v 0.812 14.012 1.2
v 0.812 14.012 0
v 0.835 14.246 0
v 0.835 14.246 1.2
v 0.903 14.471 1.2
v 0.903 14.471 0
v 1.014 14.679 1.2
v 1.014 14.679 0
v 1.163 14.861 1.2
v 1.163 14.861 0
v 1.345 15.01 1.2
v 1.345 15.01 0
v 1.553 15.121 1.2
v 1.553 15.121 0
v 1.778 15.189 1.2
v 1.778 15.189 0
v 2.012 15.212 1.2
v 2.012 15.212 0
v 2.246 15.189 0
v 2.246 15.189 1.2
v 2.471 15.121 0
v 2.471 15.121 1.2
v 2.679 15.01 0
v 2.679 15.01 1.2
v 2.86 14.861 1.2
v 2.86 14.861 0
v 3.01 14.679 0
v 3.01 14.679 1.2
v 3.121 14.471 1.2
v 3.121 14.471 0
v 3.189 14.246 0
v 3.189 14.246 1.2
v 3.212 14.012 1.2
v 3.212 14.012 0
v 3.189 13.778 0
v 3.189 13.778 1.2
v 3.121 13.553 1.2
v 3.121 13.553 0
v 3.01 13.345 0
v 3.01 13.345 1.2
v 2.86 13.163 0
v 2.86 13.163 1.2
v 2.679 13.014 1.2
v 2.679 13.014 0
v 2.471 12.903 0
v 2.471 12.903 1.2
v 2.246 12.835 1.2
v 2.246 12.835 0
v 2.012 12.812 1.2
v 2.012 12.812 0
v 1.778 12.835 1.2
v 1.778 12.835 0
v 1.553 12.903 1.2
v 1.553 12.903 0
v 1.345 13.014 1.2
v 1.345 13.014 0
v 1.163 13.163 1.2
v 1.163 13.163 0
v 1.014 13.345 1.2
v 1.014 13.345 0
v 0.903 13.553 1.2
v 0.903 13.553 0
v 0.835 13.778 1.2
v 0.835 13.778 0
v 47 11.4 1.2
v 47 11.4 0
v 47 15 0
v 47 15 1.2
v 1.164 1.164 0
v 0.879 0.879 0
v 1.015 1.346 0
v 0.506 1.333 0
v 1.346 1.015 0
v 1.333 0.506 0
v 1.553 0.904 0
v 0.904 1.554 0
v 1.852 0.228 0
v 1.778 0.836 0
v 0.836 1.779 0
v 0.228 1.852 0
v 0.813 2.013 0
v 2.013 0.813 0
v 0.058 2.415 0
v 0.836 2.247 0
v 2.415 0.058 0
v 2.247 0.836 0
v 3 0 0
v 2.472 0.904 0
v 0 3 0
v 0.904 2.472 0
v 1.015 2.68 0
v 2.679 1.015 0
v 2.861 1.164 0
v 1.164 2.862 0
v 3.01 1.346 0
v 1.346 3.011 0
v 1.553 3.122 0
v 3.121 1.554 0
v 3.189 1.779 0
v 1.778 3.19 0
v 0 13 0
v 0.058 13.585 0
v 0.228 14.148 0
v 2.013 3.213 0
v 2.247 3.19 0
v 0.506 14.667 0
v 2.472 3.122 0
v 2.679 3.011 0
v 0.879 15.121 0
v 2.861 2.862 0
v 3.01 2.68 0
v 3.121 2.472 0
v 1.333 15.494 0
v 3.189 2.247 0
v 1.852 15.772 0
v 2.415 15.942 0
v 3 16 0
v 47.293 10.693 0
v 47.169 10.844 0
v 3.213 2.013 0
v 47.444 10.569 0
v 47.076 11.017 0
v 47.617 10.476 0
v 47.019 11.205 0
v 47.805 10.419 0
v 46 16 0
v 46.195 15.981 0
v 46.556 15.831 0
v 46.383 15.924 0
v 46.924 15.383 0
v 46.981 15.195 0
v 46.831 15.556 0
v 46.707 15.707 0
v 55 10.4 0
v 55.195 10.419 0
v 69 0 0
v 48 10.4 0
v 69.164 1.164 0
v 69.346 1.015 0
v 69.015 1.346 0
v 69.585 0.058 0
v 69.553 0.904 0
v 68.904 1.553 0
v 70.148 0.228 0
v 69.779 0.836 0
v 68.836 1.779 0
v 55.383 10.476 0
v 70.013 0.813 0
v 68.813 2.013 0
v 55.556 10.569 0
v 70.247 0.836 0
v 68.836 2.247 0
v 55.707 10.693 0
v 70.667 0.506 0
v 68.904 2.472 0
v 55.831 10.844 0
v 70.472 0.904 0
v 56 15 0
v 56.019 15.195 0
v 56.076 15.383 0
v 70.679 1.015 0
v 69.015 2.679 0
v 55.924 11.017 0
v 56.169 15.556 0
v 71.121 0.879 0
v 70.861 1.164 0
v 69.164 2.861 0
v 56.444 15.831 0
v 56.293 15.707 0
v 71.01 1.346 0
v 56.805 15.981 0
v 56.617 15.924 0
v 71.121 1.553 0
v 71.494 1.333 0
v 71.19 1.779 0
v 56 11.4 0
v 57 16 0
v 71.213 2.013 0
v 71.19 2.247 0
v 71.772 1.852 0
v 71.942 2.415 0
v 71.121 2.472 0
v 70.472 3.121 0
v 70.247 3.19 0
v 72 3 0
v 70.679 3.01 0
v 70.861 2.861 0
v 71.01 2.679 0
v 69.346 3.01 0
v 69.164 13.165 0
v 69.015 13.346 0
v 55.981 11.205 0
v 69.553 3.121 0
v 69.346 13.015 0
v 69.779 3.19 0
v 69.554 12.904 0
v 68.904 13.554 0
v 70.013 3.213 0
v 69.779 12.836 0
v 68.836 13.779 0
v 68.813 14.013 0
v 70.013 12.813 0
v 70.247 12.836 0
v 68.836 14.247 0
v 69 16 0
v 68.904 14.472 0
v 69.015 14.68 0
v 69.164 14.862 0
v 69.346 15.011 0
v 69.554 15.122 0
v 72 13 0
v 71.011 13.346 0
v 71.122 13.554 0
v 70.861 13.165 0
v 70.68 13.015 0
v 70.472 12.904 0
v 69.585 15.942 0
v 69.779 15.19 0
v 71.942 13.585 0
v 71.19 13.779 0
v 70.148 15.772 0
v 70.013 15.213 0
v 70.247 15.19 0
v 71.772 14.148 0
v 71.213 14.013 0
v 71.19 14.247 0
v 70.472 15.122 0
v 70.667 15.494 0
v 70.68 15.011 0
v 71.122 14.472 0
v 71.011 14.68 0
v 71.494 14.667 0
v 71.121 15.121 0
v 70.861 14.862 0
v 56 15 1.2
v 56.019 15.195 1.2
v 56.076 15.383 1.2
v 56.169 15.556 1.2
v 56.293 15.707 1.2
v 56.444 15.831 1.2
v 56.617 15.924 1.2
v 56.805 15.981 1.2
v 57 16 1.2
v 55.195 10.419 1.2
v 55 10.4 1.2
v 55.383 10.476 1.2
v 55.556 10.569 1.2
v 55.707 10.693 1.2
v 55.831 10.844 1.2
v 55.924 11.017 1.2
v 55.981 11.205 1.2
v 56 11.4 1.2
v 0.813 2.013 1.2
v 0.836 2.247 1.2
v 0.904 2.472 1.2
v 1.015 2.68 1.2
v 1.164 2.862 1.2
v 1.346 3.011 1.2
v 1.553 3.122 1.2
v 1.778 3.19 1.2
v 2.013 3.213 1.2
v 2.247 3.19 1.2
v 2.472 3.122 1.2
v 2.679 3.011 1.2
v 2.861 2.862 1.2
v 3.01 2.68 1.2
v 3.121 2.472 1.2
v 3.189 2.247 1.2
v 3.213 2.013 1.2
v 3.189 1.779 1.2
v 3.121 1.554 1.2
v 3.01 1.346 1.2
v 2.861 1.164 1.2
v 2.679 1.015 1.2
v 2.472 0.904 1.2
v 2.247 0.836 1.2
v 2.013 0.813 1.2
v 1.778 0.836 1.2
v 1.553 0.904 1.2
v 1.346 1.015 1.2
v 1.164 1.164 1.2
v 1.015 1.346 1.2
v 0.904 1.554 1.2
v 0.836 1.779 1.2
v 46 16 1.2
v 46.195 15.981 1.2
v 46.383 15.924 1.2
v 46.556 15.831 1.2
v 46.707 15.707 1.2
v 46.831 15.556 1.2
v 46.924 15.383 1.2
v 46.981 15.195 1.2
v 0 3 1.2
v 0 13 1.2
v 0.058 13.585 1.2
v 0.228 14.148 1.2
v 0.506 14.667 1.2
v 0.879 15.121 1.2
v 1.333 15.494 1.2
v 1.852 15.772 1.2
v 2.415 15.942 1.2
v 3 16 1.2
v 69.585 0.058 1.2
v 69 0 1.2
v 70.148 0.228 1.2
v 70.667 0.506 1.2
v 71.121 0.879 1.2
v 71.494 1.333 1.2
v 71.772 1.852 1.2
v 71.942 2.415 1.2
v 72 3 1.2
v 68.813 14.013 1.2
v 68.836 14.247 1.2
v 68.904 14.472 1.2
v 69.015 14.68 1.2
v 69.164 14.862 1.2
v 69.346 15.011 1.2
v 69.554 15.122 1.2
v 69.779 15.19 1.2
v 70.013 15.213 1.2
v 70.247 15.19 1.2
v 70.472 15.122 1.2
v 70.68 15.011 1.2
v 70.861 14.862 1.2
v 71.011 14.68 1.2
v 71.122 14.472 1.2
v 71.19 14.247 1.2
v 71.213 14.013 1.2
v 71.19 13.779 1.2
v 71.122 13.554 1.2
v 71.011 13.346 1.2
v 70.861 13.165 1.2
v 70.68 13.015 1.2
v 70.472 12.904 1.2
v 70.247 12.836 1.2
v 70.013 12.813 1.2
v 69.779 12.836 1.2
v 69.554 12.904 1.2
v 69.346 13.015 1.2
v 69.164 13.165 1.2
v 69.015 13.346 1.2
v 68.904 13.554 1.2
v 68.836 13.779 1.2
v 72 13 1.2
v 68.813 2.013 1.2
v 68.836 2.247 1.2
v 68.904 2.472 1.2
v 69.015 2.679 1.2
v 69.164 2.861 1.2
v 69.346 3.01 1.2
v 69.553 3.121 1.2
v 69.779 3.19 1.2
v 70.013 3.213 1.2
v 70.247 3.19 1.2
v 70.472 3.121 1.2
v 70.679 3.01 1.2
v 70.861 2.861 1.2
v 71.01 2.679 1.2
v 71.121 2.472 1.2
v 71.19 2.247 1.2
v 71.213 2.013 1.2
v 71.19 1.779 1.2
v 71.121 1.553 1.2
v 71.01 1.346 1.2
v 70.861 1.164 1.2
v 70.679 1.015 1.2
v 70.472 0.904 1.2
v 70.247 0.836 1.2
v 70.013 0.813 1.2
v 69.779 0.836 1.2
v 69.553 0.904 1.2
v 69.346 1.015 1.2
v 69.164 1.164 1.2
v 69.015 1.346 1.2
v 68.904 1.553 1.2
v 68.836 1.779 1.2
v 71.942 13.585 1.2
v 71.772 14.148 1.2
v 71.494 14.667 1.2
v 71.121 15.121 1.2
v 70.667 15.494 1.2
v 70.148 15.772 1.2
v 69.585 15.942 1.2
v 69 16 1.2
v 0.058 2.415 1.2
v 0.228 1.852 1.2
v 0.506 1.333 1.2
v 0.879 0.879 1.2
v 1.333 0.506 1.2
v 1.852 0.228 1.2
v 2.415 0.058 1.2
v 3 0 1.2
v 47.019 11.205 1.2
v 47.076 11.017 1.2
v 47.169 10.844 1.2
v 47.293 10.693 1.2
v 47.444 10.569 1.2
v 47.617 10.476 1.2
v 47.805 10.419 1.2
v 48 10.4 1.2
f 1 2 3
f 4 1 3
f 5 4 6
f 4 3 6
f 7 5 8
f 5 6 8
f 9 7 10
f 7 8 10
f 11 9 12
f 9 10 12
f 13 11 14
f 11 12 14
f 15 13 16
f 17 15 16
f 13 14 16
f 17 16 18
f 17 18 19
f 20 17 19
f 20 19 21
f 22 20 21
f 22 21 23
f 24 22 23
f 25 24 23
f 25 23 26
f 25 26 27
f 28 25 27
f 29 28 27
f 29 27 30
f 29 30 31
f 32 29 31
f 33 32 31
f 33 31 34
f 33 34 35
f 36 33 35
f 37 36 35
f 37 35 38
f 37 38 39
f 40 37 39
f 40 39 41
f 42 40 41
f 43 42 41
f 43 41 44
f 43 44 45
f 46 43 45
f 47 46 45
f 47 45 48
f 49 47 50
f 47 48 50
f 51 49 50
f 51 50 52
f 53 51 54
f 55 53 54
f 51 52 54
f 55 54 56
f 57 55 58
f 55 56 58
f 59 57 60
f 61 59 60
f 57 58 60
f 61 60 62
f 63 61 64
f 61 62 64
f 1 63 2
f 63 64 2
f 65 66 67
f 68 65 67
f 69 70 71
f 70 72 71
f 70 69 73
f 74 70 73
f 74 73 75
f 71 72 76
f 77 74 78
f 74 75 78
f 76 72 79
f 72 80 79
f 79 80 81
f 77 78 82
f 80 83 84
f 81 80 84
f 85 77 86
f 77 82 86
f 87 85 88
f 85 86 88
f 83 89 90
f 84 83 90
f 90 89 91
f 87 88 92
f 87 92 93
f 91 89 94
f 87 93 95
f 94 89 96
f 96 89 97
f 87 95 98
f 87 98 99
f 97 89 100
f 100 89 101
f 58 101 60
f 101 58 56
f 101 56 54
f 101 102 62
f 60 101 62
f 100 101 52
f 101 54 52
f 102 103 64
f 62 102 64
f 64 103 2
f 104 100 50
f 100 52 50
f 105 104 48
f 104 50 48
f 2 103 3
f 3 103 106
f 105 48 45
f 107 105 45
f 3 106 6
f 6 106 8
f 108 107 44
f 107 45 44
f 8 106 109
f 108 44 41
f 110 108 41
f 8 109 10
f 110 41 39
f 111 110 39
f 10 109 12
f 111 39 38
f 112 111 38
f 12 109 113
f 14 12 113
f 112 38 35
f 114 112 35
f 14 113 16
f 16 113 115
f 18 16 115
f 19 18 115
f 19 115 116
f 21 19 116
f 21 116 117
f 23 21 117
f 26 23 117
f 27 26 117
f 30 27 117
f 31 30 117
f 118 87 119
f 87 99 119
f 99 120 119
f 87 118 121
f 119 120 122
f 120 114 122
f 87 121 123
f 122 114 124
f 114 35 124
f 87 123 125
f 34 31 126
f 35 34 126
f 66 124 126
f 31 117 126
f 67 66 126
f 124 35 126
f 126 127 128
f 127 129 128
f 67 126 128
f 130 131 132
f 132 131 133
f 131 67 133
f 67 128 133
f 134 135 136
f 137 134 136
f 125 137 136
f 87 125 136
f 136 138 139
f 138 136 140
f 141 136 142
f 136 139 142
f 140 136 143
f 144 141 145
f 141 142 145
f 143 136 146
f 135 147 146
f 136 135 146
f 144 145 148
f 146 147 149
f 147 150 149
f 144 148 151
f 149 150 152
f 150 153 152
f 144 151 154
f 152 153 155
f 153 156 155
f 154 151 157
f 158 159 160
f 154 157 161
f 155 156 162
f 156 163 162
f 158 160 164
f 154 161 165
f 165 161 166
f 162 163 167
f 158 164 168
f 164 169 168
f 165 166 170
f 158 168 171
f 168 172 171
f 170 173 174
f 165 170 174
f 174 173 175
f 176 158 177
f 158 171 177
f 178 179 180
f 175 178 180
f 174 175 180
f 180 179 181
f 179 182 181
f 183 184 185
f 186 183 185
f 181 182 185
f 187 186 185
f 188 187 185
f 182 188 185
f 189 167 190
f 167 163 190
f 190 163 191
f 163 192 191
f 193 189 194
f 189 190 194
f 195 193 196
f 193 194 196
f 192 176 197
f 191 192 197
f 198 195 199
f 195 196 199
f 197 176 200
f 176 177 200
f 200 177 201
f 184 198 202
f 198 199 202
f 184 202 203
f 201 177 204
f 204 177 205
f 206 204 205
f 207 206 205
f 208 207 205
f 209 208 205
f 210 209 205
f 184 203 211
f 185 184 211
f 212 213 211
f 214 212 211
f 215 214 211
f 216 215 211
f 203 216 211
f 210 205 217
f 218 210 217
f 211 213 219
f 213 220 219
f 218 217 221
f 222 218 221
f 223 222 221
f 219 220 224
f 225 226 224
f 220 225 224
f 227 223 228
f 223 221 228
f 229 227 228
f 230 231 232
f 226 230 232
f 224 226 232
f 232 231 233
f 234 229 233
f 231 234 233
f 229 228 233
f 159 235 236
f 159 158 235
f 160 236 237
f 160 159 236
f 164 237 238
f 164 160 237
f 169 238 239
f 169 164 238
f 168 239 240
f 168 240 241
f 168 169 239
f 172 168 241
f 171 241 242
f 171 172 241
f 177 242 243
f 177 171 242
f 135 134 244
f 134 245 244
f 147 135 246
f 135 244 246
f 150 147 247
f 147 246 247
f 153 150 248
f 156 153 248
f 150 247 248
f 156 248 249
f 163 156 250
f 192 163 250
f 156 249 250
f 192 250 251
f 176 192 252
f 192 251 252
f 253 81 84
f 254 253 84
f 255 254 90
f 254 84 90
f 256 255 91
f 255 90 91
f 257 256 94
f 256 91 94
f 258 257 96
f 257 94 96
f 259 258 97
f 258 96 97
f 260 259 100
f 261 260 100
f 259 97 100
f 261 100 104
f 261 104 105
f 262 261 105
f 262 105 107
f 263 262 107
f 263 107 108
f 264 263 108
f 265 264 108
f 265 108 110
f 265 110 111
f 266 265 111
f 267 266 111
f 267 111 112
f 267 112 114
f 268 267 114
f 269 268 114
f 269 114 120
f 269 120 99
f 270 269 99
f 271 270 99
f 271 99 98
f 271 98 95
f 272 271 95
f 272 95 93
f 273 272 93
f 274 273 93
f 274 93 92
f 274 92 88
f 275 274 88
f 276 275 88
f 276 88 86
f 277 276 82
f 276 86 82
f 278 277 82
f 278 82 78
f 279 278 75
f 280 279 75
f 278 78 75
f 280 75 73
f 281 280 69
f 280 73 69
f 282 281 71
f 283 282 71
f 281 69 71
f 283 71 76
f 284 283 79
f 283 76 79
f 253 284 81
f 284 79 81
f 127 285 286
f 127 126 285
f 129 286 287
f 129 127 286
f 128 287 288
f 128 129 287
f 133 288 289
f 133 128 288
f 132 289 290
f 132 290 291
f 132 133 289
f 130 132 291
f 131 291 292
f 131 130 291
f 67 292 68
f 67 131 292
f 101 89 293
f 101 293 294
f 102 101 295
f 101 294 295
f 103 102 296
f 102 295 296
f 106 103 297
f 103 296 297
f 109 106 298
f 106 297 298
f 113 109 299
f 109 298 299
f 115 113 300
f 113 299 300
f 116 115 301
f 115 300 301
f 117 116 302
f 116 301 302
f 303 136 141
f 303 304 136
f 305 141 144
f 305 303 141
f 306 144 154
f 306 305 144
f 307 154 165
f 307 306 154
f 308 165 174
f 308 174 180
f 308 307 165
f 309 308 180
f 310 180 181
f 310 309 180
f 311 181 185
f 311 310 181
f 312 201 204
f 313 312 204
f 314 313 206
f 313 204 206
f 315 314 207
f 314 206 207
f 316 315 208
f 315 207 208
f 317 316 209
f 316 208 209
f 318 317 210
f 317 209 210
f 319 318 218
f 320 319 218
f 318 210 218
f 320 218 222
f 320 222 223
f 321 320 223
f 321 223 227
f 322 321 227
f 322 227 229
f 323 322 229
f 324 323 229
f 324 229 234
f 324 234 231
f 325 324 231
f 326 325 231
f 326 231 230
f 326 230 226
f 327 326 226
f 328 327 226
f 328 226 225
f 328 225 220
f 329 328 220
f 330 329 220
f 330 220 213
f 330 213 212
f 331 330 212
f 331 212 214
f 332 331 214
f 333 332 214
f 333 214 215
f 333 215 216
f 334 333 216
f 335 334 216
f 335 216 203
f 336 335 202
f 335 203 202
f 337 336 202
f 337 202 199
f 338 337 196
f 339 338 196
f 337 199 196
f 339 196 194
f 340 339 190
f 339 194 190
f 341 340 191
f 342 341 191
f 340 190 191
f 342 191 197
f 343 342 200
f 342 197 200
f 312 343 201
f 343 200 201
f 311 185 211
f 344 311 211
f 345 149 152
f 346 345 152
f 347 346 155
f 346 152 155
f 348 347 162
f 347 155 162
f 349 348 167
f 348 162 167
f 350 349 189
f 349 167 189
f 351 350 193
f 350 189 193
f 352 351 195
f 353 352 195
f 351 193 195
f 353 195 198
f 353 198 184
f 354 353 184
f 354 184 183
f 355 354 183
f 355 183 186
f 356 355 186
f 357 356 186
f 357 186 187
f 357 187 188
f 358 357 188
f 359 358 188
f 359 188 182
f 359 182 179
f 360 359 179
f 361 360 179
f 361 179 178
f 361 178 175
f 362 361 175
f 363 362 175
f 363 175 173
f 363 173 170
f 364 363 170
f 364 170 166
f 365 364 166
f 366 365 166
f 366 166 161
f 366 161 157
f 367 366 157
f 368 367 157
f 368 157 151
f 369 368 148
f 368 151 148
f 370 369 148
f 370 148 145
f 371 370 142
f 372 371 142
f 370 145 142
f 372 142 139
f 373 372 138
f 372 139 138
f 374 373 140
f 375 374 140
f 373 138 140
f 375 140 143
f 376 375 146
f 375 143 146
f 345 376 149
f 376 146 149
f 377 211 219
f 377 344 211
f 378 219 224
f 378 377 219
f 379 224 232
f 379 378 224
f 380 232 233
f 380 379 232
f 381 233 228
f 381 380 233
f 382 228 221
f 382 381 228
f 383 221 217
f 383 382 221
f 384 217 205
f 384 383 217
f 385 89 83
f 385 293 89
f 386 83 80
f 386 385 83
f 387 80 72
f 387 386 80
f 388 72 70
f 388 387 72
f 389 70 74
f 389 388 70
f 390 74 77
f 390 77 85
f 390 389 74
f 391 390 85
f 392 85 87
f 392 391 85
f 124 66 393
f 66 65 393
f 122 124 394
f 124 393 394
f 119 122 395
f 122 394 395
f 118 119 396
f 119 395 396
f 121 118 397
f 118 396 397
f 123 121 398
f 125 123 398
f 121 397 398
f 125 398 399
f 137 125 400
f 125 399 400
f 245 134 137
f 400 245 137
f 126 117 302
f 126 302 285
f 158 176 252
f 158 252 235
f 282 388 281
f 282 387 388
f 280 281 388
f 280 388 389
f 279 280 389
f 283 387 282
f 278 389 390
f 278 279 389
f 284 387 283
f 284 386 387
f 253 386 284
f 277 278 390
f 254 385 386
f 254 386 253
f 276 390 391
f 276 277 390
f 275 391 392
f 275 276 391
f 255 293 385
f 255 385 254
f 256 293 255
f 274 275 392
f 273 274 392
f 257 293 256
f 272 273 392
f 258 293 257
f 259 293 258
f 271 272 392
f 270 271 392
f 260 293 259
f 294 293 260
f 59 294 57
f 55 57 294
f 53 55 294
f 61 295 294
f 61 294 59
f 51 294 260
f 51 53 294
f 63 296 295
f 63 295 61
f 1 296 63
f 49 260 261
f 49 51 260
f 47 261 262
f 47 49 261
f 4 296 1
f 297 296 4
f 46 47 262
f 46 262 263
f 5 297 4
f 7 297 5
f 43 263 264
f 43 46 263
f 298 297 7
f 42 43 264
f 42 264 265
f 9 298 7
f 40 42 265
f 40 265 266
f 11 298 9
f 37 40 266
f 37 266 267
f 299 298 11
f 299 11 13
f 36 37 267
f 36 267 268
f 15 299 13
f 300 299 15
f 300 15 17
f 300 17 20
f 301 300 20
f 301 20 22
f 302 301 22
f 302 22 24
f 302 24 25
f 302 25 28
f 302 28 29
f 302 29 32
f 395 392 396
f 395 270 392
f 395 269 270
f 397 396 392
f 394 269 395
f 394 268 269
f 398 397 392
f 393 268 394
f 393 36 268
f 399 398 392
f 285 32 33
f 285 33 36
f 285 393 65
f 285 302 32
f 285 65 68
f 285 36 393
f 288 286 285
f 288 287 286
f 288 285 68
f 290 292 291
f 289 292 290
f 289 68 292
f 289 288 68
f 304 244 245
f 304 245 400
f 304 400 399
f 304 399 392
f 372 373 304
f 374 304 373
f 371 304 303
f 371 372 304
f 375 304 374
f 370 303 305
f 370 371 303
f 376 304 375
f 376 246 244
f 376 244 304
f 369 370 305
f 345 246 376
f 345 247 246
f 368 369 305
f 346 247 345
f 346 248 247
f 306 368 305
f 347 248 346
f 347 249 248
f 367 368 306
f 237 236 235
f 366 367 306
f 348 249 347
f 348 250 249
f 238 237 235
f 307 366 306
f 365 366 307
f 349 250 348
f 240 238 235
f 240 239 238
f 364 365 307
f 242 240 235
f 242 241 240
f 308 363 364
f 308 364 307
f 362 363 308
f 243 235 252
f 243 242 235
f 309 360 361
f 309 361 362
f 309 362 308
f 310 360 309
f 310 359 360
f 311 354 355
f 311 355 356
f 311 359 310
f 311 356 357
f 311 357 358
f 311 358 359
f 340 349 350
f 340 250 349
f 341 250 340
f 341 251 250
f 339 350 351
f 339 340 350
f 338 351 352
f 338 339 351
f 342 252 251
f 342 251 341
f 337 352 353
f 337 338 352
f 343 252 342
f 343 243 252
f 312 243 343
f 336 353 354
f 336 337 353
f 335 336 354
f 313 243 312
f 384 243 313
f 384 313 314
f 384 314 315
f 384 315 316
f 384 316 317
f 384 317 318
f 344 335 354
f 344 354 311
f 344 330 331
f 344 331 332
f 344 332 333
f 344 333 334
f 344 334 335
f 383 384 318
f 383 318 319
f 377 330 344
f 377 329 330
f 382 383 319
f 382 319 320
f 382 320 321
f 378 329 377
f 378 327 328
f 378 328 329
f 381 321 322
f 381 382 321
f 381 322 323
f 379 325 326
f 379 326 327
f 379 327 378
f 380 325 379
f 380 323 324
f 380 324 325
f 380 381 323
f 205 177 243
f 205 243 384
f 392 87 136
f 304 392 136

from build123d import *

# Parameters (mm, degrees)
SKETCH_1_W          = 72
SKETCH_1_H          = 16
EXTRUDE_1_DEPTH     = 1.2
FILLET_1_R          = 3
CUT_EXTRUDE_1_REACH = 75.766
SKETCH_3_R          = 1.2
CUT_EXTRUDE_2_REACH = 75.766
SKETCH_4_W          = 9
SKETCH_4_H          = 6
FILLET_2_R          = 1


with BuildPart() as part:
    # 草图1 → 凸台-拉伸1 (new body)
    with BuildSketch(Plane.XY):
        with Locations((36, 8)):
            Rectangle(SKETCH_1_W, SKETCH_1_H)
    extrude(amount=EXTRUDE_1_DEPTH)

    # 圆角1
    fillet_1_edges = [part.edges().sort_by_distance(p)[0] for p in [
        (0, 16, 0.6),
        (72, 16, 0.6),
        (72, 0, 0.6),
        (0, 0, 0.6),
    ]]
    fillet(fillet_1_edges, radius=FILLET_1_R)

    # 草图3 → 切除-拉伸1 (cut, up to next)
    with BuildSketch(Plane(origin=(0, 0, 0), x_dir=(-1, 0, 0), z_dir=(0, 0, -1)), mode=Mode.PRIVATE) as cut_extrude_1_sk1:
        with Locations((-70.012877826, 14.013032766)):
            Circle(SKETCH_3_R)
    cut_extrude_1_tool1 = extrude(cut_extrude_1_sk1.sketch, amount=-CUT_EXTRUDE_1_REACH, mode=Mode.PRIVATE) & part.part
    # 草图3 → 切除-拉伸1 (cut, up to next)
    with BuildSketch(Plane(origin=(0, 0, 0), x_dir=(-1, 0, 0), z_dir=(0, 0, -1)), mode=Mode.PRIVATE) as cut_extrude_1_sk2:
        with Locations((-70.012694945, 2.012672085)):
            Circle(SKETCH_3_R)
    cut_extrude_1_tool2 = extrude(cut_extrude_1_sk2.sketch, amount=-CUT_EXTRUDE_1_REACH, mode=Mode.PRIVATE) & part.part
    # 草图3 → 切除-拉伸1 (cut, up to next)
    with BuildSketch(Plane(origin=(0, 0, 0), x_dir=(-1, 0, 0), z_dir=(0, 0, -1)), mode=Mode.PRIVATE) as cut_extrude_1_sk3:
        with Locations((-2.011949988, 14.012003328)):
            Circle(SKETCH_3_R)
    cut_extrude_1_tool3 = extrude(cut_extrude_1_sk3.sketch, amount=-CUT_EXTRUDE_1_REACH, mode=Mode.PRIVATE) & part.part
    # 草图3 → 切除-拉伸1 (cut, up to next)
    with BuildSketch(Plane(origin=(0, 0, 0), x_dir=(-1, 0, 0), z_dir=(0, 0, -1)), mode=Mode.PRIVATE) as cut_extrude_1_sk4:
        with Locations((-2.012501905, 2.013009906)):
            Circle(SKETCH_3_R)
    cut_extrude_1_tool4 = extrude(cut_extrude_1_sk4.sketch, amount=-CUT_EXTRUDE_1_REACH, mode=Mode.PRIVATE) & part.part
    add(cut_extrude_1_tool1.solids().sort_by_distance((70.012878, 14.013033, 0))[0], mode=Mode.SUBTRACT)
    add(cut_extrude_1_tool2.solids().sort_by_distance((70.012695, 2.012672, 0))[0], mode=Mode.SUBTRACT)
    add(cut_extrude_1_tool3.solids().sort_by_distance((2.01195, 14.012003, 0))[0], mode=Mode.SUBTRACT)
    add(cut_extrude_1_tool4.solids().sort_by_distance((2.012502, 2.01301, 0))[0], mode=Mode.SUBTRACT)

    # 草图4 → 切除-拉伸2 (cut, up to next)
    with BuildSketch(Plane(origin=(0, 0, 0), x_dir=(-1, 0, 0), z_dir=(0, 0, -1)), mode=Mode.PRIVATE) as cut_extrude_2_sk1:
        with Locations((-51.5, 13.4)):
            Rectangle(SKETCH_4_W, SKETCH_4_H)
    cut_extrude_2_tool1 = extrude(cut_extrude_2_sk1.sketch, amount=-CUT_EXTRUDE_2_REACH, mode=Mode.PRIVATE) & part.part
    add(cut_extrude_2_tool1.solids().sort_by_distance((51.5, 13.4, 0))[0], mode=Mode.SUBTRACT)

    # 圆角2
    fillet_2_edges = [part.edges().sort_by_distance(p)[0] for p in [
        (56, 16, 0.6),
        (47, 16, 0.6),
        (56, 10.4, 0.6),
        (47, 10.4, 0.6),
    ]]
    fillet(fillet_2_edges, radius=FILLET_2_R)


solid = part.part
